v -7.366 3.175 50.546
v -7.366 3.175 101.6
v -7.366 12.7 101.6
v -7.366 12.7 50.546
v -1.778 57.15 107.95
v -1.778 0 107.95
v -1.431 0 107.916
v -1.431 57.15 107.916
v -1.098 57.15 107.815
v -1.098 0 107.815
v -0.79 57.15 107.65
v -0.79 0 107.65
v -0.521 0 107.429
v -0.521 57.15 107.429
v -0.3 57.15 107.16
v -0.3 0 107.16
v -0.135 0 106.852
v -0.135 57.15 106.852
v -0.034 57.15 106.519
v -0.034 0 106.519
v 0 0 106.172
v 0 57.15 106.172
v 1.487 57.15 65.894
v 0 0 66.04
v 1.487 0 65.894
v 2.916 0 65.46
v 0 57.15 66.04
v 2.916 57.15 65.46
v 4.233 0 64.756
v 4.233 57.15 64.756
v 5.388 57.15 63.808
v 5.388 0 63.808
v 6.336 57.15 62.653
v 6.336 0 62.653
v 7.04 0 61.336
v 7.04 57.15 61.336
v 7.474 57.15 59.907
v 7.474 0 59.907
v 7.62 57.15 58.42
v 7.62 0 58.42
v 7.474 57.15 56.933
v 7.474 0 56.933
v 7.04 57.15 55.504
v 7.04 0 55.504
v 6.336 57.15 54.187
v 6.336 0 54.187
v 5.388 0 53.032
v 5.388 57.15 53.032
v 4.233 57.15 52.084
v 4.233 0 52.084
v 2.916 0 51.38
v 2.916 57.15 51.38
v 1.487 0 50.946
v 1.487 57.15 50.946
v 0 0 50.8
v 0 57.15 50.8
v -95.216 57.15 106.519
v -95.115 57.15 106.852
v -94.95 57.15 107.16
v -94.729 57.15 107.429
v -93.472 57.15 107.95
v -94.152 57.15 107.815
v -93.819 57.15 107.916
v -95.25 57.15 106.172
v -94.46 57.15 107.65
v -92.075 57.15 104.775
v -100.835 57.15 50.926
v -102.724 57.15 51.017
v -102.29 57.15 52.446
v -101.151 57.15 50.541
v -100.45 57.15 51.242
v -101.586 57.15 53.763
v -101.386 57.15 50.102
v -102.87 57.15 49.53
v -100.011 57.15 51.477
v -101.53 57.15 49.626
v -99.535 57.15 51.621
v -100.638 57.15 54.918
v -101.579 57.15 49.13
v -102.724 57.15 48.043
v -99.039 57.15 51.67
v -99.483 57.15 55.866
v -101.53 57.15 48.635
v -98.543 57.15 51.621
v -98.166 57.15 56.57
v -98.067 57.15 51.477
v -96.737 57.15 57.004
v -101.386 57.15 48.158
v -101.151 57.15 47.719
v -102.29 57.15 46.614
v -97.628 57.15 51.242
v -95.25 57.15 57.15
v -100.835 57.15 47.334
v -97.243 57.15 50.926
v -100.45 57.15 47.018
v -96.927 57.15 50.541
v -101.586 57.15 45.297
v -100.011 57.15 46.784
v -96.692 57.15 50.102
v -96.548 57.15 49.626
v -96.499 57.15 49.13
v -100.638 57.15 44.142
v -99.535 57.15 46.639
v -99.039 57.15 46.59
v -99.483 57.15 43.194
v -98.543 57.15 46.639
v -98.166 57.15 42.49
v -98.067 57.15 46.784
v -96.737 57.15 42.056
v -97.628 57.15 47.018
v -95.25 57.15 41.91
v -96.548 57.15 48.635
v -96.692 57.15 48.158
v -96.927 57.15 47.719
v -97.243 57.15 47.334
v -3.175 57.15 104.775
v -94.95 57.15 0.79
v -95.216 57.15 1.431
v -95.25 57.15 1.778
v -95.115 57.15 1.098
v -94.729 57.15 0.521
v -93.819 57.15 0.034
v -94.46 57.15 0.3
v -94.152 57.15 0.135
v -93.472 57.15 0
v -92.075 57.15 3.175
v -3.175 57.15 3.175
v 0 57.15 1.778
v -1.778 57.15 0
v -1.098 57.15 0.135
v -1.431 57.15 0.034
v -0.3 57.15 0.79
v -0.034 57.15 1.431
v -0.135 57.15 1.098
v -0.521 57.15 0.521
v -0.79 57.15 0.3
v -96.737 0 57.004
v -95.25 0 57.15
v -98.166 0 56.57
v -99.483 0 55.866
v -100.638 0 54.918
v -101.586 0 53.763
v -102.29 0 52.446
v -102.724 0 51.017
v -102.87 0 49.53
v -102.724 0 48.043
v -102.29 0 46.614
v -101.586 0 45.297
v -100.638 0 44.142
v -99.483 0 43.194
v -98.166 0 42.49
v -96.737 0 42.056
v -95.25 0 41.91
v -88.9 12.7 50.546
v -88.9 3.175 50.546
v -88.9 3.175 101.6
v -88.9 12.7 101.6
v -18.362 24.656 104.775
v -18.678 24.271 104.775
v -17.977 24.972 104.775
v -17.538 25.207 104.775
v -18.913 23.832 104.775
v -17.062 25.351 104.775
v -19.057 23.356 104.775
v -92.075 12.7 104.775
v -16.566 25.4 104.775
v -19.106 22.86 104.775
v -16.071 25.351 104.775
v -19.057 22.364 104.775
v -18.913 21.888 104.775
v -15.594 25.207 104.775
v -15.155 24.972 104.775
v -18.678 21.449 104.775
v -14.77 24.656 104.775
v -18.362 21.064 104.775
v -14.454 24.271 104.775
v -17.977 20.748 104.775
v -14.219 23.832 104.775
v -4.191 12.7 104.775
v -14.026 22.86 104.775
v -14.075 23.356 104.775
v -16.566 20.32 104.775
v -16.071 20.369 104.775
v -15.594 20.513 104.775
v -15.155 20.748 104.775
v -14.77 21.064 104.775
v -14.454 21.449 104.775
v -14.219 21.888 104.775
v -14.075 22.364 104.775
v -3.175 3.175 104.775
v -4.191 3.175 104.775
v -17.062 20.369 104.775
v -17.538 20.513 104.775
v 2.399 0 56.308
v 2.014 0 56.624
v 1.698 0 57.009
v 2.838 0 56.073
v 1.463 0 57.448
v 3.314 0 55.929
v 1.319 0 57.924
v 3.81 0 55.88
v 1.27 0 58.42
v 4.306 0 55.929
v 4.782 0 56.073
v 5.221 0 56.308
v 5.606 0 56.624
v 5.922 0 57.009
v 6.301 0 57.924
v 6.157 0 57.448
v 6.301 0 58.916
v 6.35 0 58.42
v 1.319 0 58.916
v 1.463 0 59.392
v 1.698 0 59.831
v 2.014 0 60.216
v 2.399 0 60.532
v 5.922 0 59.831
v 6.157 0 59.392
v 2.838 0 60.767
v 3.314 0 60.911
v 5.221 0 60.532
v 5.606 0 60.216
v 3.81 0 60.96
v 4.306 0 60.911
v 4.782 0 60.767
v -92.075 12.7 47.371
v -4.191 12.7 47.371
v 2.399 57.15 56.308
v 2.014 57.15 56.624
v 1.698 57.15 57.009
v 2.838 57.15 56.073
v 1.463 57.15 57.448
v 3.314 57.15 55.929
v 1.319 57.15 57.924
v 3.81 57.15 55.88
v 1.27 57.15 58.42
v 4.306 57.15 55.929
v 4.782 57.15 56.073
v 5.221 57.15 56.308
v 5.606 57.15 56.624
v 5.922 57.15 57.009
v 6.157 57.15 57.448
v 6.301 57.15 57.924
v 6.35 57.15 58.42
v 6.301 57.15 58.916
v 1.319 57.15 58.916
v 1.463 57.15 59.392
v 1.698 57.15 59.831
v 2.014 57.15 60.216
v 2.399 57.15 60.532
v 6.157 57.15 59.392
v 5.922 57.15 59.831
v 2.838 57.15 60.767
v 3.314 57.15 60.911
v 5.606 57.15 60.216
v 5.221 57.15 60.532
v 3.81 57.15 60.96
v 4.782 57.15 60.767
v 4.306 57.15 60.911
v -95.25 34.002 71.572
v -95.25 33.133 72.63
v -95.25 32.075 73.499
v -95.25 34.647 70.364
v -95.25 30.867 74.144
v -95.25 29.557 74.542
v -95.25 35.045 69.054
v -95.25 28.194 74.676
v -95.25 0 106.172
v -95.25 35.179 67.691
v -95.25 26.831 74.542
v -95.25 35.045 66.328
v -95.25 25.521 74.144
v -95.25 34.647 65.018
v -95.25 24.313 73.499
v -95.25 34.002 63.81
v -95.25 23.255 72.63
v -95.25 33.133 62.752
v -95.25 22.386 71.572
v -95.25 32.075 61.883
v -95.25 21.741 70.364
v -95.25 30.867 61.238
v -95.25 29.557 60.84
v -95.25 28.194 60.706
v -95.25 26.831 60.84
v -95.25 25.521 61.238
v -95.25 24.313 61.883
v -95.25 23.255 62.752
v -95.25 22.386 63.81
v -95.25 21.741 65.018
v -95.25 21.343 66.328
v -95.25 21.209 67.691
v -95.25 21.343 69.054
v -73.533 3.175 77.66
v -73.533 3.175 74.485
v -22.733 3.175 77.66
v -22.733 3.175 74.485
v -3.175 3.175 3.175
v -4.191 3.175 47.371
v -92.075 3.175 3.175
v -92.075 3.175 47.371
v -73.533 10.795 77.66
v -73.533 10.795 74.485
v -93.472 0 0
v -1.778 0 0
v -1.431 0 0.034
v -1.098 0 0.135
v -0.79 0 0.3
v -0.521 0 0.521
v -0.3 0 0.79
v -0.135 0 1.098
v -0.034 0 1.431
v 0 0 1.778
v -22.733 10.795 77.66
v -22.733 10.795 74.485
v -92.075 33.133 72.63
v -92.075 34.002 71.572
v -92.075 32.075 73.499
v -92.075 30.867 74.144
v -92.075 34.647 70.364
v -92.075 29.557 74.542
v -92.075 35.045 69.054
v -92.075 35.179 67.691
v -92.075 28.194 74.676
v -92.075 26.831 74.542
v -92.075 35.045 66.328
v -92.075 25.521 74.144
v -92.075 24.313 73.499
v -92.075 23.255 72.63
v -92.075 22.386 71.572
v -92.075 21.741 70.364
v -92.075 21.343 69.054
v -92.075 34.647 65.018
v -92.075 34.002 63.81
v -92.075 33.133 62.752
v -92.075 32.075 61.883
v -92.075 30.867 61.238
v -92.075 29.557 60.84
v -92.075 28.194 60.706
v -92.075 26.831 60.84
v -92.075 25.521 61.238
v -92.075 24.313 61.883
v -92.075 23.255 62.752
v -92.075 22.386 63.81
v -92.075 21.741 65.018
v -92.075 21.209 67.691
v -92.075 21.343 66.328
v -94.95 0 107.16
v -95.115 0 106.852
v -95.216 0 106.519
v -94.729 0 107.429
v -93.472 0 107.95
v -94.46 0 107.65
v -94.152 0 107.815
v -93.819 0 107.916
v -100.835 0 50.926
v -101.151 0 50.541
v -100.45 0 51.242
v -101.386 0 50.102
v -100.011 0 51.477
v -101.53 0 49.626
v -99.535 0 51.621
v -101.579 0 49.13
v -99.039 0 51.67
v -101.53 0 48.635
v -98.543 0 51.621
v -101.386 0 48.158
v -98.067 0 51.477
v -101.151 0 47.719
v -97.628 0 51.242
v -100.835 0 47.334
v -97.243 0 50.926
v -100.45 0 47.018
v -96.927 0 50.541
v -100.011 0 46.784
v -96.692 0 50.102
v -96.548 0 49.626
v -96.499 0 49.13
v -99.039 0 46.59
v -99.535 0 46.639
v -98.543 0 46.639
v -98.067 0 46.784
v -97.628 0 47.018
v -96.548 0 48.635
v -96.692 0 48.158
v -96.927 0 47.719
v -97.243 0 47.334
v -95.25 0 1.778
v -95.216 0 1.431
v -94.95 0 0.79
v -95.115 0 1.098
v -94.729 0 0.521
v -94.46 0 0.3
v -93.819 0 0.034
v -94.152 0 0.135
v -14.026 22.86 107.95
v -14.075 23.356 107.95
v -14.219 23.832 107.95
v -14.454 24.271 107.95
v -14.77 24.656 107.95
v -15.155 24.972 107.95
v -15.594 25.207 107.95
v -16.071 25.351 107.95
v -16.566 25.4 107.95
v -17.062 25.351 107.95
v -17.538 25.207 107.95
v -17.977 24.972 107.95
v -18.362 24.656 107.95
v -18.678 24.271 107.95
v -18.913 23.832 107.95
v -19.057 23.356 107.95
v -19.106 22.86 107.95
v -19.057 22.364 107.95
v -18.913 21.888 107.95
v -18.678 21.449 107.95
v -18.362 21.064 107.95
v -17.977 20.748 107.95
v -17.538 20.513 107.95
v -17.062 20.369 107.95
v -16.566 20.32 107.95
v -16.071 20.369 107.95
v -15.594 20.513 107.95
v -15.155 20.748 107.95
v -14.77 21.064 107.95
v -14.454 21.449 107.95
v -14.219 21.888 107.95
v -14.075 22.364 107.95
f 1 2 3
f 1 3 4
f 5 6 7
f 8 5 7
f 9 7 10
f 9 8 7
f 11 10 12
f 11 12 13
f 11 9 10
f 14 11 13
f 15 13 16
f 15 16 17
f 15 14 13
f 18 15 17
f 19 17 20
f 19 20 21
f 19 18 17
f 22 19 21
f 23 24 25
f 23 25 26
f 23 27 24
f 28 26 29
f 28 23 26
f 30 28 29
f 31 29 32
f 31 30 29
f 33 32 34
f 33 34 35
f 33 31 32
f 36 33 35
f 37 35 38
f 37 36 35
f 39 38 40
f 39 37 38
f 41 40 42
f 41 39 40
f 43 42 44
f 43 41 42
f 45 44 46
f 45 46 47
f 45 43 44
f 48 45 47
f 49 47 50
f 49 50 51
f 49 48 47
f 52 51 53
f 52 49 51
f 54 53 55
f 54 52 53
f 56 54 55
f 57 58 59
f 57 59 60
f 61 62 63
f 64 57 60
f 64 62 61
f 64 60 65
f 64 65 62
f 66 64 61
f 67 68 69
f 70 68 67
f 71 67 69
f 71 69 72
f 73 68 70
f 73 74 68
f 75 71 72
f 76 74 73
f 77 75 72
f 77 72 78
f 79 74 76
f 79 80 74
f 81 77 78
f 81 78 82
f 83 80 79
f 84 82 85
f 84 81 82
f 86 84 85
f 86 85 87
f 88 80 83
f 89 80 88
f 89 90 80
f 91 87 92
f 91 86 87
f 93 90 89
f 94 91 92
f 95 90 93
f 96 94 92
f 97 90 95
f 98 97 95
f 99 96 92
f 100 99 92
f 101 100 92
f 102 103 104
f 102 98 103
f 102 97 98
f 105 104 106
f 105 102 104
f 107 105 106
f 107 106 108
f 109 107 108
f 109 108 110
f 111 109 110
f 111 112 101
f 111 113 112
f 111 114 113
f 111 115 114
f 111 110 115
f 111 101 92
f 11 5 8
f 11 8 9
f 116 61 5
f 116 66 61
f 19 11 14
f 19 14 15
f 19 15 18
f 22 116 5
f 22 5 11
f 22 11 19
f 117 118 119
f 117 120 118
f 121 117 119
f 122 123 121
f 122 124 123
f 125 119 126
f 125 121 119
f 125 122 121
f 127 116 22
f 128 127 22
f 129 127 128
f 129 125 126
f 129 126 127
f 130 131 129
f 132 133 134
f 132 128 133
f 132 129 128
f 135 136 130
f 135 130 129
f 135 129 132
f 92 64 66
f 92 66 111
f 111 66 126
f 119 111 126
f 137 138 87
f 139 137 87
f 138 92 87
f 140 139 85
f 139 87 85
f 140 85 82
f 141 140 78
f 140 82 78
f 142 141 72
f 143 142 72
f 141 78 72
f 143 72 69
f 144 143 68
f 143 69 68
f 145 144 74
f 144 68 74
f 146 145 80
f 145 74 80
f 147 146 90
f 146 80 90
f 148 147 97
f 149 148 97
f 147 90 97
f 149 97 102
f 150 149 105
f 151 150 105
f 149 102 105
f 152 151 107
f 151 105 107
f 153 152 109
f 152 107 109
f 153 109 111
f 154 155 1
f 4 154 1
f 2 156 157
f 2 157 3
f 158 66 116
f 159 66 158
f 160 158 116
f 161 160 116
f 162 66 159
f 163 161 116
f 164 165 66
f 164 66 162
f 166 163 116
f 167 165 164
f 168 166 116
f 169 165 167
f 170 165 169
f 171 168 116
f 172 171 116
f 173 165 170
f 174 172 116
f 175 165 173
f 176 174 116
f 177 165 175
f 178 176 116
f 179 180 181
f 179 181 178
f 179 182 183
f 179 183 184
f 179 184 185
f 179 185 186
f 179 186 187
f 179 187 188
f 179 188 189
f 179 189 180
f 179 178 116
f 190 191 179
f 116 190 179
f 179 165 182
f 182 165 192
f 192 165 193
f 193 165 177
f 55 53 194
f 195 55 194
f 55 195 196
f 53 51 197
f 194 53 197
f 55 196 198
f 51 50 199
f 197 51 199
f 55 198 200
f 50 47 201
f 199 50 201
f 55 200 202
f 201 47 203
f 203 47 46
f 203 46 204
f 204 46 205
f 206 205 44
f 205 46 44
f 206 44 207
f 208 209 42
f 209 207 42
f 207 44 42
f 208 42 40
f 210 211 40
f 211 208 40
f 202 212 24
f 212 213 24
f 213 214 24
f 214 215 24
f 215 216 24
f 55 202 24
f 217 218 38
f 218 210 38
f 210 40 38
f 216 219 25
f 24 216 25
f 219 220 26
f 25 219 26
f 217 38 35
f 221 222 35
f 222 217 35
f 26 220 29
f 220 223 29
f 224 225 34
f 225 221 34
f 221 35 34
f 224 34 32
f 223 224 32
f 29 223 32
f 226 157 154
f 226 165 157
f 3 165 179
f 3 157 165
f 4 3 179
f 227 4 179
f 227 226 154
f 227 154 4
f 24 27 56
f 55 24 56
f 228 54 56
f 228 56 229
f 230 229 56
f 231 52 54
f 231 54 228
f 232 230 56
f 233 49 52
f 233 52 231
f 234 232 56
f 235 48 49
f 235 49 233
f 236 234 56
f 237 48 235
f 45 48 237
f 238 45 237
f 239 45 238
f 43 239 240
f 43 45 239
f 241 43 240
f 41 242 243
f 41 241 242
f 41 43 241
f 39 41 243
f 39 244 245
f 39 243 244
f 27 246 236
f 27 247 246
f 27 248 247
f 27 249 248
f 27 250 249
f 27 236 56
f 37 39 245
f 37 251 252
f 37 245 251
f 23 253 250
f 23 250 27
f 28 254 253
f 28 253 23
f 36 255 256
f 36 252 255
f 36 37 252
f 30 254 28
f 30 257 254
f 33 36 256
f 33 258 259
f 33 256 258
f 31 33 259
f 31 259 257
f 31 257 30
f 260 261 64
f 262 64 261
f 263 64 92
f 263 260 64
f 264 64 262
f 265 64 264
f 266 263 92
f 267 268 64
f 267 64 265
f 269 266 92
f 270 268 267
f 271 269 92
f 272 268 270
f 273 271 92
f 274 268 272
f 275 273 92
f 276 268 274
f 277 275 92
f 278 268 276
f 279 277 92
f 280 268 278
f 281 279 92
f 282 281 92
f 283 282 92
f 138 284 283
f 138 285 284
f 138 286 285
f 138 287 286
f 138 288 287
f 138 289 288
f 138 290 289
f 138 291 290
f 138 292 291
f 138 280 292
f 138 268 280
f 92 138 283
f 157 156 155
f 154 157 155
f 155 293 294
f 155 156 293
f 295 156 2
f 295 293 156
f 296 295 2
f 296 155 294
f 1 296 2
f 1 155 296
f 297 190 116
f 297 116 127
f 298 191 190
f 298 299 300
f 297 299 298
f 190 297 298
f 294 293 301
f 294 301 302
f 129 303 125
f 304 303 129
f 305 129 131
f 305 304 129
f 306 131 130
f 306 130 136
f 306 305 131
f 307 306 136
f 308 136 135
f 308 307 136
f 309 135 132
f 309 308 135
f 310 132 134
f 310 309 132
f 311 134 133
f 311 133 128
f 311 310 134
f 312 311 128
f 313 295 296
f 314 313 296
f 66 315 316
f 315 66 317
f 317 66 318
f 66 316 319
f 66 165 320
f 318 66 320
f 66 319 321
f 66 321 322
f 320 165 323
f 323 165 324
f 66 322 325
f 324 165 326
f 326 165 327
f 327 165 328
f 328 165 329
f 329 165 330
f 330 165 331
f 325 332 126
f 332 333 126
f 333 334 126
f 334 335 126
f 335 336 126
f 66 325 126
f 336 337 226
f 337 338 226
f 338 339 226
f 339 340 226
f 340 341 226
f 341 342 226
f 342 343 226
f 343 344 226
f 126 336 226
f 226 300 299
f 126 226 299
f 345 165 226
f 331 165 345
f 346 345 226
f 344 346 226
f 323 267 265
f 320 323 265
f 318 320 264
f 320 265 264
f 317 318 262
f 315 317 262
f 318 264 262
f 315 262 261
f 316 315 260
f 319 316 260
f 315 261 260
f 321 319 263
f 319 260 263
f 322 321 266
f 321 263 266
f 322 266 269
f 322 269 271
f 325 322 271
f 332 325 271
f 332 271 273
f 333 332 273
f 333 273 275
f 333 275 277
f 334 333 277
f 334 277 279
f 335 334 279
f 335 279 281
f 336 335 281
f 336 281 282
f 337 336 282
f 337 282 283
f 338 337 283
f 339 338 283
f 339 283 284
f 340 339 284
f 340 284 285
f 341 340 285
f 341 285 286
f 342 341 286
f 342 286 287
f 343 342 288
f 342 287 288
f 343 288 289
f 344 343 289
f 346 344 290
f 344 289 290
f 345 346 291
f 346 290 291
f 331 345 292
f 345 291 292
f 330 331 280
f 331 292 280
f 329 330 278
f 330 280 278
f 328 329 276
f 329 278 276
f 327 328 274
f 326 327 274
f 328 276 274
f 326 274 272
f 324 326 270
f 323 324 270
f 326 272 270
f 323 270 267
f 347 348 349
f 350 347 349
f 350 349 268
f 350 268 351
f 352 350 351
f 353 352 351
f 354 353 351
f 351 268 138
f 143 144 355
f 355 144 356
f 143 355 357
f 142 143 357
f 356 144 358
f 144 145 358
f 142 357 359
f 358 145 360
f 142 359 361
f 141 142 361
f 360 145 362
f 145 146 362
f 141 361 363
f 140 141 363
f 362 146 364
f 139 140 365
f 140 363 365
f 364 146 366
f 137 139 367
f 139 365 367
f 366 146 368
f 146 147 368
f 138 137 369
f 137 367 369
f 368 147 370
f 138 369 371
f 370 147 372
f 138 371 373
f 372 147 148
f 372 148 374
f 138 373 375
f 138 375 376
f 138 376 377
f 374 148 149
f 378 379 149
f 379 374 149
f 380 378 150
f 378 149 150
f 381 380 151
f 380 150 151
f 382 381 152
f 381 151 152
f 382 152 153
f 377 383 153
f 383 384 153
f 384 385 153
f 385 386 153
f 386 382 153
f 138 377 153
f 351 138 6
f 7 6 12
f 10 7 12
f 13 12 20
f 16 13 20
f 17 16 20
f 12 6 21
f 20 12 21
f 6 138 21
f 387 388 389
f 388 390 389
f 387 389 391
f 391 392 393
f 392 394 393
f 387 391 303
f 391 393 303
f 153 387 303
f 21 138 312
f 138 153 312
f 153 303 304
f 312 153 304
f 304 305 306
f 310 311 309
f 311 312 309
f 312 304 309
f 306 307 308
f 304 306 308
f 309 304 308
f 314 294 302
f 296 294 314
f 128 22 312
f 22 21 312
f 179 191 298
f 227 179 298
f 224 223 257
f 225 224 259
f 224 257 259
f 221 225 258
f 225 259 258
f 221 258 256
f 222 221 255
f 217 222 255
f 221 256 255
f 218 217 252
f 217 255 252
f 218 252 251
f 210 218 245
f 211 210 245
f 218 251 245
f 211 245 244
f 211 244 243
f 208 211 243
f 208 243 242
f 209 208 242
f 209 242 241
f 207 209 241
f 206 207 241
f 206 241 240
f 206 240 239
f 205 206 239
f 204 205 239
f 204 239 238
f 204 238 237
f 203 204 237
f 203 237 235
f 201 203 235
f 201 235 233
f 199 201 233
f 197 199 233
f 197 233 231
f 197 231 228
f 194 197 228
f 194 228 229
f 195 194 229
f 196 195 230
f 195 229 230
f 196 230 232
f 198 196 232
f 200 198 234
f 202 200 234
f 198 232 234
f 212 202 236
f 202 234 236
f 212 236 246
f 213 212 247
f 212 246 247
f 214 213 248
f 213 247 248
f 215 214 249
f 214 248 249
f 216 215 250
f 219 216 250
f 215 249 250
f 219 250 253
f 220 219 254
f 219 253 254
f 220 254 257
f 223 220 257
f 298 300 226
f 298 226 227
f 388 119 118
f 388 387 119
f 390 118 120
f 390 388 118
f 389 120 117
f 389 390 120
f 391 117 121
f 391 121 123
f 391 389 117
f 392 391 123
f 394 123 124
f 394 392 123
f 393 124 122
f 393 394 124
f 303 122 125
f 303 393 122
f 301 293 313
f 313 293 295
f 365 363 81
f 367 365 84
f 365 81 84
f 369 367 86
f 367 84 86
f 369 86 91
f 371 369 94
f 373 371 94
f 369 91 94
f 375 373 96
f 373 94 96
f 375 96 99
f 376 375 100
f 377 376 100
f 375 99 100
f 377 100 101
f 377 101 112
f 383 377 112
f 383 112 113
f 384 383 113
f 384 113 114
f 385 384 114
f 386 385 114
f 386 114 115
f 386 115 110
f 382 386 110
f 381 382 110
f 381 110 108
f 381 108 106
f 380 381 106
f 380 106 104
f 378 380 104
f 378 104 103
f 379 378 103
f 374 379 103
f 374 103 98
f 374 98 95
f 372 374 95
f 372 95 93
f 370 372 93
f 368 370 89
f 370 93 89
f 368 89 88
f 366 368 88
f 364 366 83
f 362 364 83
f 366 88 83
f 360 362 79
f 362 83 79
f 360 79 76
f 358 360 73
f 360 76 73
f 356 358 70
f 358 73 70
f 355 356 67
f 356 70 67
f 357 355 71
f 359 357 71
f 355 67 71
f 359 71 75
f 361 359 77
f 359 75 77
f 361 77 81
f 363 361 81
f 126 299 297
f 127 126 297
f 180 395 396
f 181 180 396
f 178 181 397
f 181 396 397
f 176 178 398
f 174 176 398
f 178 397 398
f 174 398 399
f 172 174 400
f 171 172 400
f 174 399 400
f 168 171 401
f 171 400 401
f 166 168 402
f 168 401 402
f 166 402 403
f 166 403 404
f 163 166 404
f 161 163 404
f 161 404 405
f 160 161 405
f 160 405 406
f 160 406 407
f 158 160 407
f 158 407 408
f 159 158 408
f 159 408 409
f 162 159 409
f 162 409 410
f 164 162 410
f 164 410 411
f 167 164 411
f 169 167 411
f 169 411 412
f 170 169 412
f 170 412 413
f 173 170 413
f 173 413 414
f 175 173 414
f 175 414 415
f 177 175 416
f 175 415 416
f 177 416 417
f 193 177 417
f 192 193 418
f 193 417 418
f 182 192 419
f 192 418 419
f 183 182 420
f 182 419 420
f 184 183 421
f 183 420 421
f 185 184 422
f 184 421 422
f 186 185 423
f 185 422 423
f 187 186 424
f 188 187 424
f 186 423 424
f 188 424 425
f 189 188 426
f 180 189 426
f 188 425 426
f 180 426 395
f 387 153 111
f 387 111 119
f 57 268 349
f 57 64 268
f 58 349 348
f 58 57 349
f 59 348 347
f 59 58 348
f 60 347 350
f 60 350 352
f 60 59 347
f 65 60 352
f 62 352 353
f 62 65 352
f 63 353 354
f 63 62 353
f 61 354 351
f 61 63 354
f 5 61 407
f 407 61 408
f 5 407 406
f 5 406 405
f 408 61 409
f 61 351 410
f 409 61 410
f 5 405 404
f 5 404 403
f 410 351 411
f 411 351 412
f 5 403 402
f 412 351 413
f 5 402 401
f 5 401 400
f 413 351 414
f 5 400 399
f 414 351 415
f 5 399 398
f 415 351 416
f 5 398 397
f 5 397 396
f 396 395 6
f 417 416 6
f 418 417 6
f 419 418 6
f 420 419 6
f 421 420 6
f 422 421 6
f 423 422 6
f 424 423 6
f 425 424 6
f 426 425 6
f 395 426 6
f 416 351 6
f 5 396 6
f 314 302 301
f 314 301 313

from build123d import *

# Parameters (mm, degrees)
SKETCH1_W           = 95.25
SKETCH1_H           = 107.95
BOSS_EXTRUDE1_DEPTH = 3.175
SKETCH1_3_W         = 95.25
SKETCH1_3_H         = 107.95
SKETCH1_3_W_2       = 88.9
SKETCH1_3_H_2       = 101.6
BOSS_EXTRUDE2_DEPTH = 57.15
SKETCH3_R           = 2.54
CUT_EXTRUDE1_DEPTH  = 12.7
FILLET1_R           = 1.778
SKETCH5_W           = 7.62
SKETCH5_H           = 57.15
REVOLVE1_ANGLE      = 180
SKETCH6_W           = 7.62
SKETCH6_H           = 57.15
REVOLVE2_ANGLE      = 180
SKETCH7_R           = 2.54
CUT_EXTRUDE2_DEPTH  = 160.69208465
SKETCH9_R           = 2.54
CUT_EXTRUDE3_DEPTH  = 160.69208465
SKETCH10_W          = 87.884
SKETCH10_H          = 57.404
SKETCH10_W_2        = 81.534
SKETCH10_H_2        = 51.054
BOSS_EXTRUDE3_DEPTH = 9.525
SKETCH11_W          = 50.8
SKETCH11_H          = 3.175
BOSS_EXTRUDE4_DEPTH = 7.62
SKETCH12_R          = 6.985
CUT_EXTRUDE4_DEPTH  = 7.62


with BuildPart() as part:
    # Sketch1 → Boss-Extrude1 (new body)
    with BuildSketch(Plane(origin=(0, 0, 0), x_dir=(1, 0, 0), z_dir=(0, 1, 0))):
        with Locations((-47.625, -53.975)):
            Rectangle(SKETCH1_W, SKETCH1_H)
    extrude(amount=BOSS_EXTRUDE1_DEPTH)

    # Sketch1<3> → Boss-Extrude2 (add)
    with BuildSketch(Plane(origin=(0, 0, 0), x_dir=(1, 0, 0), z_dir=(0, 1, 0))):
        with Locations((-47.625, -53.975)):
            Rectangle(SKETCH1_3_W, SKETCH1_3_H)
        with Locations((-47.625, -53.975)):
            Rectangle(SKETCH1_3_W_2, SKETCH1_3_H_2, mode=Mode.SUBTRACT)
    extrude(amount=BOSS_EXTRUDE2_DEPTH)

    # Sketch3 → Cut-Extrude1 (cut)
    with BuildSketch(Plane.XY.offset(107.95)):
        with Locations((-16.566148484, 22.86)):
            Circle(SKETCH3_R)
    extrude(amount=-CUT_EXTRUDE1_DEPTH, mode=Mode.SUBTRACT)

    # Fillet1
    fillet1_edges = [part.edges().sort_by_distance(p)[0] for p in [
        (-95.25, 28.575, 0),
        (0, 28.575, 0),
        (0, 28.575, 107.95),
        (-95.25, 28.575, 107.95),
    ]]
    fillet(fillet1_edges, radius=FILLET1_R)

    # Sketch6 → Revolve2 (revolve)
    with BuildSketch(Plane.ZY.offset(95.25)):
        with Locations((53.34, 28.575)):
            Rectangle(SKETCH6_W, SKETCH6_H)
    revolve(axis=Axis((-95.25, 57.15, 49.53), (0, -1, 0)), revolution_arc=REVOLVE2_ANGLE)

    # Sketch7 → Cut-Extrude2 (cut, through all)
    with BuildSketch(Plane(origin=(0, 57.15, 0), x_dir=(1, 0, 0), z_dir=(0, 1, 0))):
        with Locations((-99.038975602, -49.13029525)):
            Circle(SKETCH7_R)
    extrude(amount=-CUT_EXTRUDE2_DEPTH, mode=Mode.SUBTRACT)

    # Sketch10 → Boss-Extrude3 (add)
    with BuildSketch(Plane(origin=(0, 3.175, 0), x_dir=(1, 0, 0), z_dir=(0, 1, 0))):
        with Locations((-48.133, -76.073)):
            Rectangle(SKETCH10_W, SKETCH10_H)
        with Locations((-48.133, -76.073)):
            Rectangle(SKETCH10_W_2, SKETCH10_H_2, mode=Mode.SUBTRACT)
    extrude(amount=BOSS_EXTRUDE3_DEPTH)

    # Sketch11 → Boss-Extrude4 (add)
    with BuildSketch(Plane(origin=(0, 3.175, 0), x_dir=(1, 0, 0), z_dir=(0, 1, 0))):
        with Locations((-48.133, -76.073)):
            Rectangle(SKETCH11_W, SKETCH11_H)
    extrude(amount=BOSS_EXTRUDE4_DEPTH)

    # Sketch12 → Cut-Extrude4 (cut)
    with BuildSketch(Plane.ZY.offset(95.25)):
        with Locations((67.691, 28.194)):
            Circle(SKETCH12_R)
    extrude(amount=-CUT_EXTRUDE4_DEPTH, mode=Mode.SUBTRACT)


with BuildPart() as body_2:
    # Sketch5 → Revolve1 (revolve)
    with BuildSketch(Plane(origin=(0, 0, 0), x_dir=(0, 0, -1), z_dir=(1, 0, 0))):
        with Locations((-62.23, 28.575)):
            Rectangle(SKETCH5_W, SKETCH5_H)
    revolve(axis=Axis((0, 57.15, 58.42), (0, 1, 0)), revolution_arc=REVOLVE1_ANGLE)

    # Sketch9 → Cut-Extrude3 (cut, through all)
    with BuildSketch(Plane(origin=(0, 57.15, 0), x_dir=(1, 0, 0), z_dir=(0, 1, 0))):
        with Locations((3.81, -58.42)):
            Circle(SKETCH9_R)
    extrude(amount=-CUT_EXTRUDE3_DEPTH, mode=Mode.SUBTRACT)


solid = Compound([part.part, body_2.part])
